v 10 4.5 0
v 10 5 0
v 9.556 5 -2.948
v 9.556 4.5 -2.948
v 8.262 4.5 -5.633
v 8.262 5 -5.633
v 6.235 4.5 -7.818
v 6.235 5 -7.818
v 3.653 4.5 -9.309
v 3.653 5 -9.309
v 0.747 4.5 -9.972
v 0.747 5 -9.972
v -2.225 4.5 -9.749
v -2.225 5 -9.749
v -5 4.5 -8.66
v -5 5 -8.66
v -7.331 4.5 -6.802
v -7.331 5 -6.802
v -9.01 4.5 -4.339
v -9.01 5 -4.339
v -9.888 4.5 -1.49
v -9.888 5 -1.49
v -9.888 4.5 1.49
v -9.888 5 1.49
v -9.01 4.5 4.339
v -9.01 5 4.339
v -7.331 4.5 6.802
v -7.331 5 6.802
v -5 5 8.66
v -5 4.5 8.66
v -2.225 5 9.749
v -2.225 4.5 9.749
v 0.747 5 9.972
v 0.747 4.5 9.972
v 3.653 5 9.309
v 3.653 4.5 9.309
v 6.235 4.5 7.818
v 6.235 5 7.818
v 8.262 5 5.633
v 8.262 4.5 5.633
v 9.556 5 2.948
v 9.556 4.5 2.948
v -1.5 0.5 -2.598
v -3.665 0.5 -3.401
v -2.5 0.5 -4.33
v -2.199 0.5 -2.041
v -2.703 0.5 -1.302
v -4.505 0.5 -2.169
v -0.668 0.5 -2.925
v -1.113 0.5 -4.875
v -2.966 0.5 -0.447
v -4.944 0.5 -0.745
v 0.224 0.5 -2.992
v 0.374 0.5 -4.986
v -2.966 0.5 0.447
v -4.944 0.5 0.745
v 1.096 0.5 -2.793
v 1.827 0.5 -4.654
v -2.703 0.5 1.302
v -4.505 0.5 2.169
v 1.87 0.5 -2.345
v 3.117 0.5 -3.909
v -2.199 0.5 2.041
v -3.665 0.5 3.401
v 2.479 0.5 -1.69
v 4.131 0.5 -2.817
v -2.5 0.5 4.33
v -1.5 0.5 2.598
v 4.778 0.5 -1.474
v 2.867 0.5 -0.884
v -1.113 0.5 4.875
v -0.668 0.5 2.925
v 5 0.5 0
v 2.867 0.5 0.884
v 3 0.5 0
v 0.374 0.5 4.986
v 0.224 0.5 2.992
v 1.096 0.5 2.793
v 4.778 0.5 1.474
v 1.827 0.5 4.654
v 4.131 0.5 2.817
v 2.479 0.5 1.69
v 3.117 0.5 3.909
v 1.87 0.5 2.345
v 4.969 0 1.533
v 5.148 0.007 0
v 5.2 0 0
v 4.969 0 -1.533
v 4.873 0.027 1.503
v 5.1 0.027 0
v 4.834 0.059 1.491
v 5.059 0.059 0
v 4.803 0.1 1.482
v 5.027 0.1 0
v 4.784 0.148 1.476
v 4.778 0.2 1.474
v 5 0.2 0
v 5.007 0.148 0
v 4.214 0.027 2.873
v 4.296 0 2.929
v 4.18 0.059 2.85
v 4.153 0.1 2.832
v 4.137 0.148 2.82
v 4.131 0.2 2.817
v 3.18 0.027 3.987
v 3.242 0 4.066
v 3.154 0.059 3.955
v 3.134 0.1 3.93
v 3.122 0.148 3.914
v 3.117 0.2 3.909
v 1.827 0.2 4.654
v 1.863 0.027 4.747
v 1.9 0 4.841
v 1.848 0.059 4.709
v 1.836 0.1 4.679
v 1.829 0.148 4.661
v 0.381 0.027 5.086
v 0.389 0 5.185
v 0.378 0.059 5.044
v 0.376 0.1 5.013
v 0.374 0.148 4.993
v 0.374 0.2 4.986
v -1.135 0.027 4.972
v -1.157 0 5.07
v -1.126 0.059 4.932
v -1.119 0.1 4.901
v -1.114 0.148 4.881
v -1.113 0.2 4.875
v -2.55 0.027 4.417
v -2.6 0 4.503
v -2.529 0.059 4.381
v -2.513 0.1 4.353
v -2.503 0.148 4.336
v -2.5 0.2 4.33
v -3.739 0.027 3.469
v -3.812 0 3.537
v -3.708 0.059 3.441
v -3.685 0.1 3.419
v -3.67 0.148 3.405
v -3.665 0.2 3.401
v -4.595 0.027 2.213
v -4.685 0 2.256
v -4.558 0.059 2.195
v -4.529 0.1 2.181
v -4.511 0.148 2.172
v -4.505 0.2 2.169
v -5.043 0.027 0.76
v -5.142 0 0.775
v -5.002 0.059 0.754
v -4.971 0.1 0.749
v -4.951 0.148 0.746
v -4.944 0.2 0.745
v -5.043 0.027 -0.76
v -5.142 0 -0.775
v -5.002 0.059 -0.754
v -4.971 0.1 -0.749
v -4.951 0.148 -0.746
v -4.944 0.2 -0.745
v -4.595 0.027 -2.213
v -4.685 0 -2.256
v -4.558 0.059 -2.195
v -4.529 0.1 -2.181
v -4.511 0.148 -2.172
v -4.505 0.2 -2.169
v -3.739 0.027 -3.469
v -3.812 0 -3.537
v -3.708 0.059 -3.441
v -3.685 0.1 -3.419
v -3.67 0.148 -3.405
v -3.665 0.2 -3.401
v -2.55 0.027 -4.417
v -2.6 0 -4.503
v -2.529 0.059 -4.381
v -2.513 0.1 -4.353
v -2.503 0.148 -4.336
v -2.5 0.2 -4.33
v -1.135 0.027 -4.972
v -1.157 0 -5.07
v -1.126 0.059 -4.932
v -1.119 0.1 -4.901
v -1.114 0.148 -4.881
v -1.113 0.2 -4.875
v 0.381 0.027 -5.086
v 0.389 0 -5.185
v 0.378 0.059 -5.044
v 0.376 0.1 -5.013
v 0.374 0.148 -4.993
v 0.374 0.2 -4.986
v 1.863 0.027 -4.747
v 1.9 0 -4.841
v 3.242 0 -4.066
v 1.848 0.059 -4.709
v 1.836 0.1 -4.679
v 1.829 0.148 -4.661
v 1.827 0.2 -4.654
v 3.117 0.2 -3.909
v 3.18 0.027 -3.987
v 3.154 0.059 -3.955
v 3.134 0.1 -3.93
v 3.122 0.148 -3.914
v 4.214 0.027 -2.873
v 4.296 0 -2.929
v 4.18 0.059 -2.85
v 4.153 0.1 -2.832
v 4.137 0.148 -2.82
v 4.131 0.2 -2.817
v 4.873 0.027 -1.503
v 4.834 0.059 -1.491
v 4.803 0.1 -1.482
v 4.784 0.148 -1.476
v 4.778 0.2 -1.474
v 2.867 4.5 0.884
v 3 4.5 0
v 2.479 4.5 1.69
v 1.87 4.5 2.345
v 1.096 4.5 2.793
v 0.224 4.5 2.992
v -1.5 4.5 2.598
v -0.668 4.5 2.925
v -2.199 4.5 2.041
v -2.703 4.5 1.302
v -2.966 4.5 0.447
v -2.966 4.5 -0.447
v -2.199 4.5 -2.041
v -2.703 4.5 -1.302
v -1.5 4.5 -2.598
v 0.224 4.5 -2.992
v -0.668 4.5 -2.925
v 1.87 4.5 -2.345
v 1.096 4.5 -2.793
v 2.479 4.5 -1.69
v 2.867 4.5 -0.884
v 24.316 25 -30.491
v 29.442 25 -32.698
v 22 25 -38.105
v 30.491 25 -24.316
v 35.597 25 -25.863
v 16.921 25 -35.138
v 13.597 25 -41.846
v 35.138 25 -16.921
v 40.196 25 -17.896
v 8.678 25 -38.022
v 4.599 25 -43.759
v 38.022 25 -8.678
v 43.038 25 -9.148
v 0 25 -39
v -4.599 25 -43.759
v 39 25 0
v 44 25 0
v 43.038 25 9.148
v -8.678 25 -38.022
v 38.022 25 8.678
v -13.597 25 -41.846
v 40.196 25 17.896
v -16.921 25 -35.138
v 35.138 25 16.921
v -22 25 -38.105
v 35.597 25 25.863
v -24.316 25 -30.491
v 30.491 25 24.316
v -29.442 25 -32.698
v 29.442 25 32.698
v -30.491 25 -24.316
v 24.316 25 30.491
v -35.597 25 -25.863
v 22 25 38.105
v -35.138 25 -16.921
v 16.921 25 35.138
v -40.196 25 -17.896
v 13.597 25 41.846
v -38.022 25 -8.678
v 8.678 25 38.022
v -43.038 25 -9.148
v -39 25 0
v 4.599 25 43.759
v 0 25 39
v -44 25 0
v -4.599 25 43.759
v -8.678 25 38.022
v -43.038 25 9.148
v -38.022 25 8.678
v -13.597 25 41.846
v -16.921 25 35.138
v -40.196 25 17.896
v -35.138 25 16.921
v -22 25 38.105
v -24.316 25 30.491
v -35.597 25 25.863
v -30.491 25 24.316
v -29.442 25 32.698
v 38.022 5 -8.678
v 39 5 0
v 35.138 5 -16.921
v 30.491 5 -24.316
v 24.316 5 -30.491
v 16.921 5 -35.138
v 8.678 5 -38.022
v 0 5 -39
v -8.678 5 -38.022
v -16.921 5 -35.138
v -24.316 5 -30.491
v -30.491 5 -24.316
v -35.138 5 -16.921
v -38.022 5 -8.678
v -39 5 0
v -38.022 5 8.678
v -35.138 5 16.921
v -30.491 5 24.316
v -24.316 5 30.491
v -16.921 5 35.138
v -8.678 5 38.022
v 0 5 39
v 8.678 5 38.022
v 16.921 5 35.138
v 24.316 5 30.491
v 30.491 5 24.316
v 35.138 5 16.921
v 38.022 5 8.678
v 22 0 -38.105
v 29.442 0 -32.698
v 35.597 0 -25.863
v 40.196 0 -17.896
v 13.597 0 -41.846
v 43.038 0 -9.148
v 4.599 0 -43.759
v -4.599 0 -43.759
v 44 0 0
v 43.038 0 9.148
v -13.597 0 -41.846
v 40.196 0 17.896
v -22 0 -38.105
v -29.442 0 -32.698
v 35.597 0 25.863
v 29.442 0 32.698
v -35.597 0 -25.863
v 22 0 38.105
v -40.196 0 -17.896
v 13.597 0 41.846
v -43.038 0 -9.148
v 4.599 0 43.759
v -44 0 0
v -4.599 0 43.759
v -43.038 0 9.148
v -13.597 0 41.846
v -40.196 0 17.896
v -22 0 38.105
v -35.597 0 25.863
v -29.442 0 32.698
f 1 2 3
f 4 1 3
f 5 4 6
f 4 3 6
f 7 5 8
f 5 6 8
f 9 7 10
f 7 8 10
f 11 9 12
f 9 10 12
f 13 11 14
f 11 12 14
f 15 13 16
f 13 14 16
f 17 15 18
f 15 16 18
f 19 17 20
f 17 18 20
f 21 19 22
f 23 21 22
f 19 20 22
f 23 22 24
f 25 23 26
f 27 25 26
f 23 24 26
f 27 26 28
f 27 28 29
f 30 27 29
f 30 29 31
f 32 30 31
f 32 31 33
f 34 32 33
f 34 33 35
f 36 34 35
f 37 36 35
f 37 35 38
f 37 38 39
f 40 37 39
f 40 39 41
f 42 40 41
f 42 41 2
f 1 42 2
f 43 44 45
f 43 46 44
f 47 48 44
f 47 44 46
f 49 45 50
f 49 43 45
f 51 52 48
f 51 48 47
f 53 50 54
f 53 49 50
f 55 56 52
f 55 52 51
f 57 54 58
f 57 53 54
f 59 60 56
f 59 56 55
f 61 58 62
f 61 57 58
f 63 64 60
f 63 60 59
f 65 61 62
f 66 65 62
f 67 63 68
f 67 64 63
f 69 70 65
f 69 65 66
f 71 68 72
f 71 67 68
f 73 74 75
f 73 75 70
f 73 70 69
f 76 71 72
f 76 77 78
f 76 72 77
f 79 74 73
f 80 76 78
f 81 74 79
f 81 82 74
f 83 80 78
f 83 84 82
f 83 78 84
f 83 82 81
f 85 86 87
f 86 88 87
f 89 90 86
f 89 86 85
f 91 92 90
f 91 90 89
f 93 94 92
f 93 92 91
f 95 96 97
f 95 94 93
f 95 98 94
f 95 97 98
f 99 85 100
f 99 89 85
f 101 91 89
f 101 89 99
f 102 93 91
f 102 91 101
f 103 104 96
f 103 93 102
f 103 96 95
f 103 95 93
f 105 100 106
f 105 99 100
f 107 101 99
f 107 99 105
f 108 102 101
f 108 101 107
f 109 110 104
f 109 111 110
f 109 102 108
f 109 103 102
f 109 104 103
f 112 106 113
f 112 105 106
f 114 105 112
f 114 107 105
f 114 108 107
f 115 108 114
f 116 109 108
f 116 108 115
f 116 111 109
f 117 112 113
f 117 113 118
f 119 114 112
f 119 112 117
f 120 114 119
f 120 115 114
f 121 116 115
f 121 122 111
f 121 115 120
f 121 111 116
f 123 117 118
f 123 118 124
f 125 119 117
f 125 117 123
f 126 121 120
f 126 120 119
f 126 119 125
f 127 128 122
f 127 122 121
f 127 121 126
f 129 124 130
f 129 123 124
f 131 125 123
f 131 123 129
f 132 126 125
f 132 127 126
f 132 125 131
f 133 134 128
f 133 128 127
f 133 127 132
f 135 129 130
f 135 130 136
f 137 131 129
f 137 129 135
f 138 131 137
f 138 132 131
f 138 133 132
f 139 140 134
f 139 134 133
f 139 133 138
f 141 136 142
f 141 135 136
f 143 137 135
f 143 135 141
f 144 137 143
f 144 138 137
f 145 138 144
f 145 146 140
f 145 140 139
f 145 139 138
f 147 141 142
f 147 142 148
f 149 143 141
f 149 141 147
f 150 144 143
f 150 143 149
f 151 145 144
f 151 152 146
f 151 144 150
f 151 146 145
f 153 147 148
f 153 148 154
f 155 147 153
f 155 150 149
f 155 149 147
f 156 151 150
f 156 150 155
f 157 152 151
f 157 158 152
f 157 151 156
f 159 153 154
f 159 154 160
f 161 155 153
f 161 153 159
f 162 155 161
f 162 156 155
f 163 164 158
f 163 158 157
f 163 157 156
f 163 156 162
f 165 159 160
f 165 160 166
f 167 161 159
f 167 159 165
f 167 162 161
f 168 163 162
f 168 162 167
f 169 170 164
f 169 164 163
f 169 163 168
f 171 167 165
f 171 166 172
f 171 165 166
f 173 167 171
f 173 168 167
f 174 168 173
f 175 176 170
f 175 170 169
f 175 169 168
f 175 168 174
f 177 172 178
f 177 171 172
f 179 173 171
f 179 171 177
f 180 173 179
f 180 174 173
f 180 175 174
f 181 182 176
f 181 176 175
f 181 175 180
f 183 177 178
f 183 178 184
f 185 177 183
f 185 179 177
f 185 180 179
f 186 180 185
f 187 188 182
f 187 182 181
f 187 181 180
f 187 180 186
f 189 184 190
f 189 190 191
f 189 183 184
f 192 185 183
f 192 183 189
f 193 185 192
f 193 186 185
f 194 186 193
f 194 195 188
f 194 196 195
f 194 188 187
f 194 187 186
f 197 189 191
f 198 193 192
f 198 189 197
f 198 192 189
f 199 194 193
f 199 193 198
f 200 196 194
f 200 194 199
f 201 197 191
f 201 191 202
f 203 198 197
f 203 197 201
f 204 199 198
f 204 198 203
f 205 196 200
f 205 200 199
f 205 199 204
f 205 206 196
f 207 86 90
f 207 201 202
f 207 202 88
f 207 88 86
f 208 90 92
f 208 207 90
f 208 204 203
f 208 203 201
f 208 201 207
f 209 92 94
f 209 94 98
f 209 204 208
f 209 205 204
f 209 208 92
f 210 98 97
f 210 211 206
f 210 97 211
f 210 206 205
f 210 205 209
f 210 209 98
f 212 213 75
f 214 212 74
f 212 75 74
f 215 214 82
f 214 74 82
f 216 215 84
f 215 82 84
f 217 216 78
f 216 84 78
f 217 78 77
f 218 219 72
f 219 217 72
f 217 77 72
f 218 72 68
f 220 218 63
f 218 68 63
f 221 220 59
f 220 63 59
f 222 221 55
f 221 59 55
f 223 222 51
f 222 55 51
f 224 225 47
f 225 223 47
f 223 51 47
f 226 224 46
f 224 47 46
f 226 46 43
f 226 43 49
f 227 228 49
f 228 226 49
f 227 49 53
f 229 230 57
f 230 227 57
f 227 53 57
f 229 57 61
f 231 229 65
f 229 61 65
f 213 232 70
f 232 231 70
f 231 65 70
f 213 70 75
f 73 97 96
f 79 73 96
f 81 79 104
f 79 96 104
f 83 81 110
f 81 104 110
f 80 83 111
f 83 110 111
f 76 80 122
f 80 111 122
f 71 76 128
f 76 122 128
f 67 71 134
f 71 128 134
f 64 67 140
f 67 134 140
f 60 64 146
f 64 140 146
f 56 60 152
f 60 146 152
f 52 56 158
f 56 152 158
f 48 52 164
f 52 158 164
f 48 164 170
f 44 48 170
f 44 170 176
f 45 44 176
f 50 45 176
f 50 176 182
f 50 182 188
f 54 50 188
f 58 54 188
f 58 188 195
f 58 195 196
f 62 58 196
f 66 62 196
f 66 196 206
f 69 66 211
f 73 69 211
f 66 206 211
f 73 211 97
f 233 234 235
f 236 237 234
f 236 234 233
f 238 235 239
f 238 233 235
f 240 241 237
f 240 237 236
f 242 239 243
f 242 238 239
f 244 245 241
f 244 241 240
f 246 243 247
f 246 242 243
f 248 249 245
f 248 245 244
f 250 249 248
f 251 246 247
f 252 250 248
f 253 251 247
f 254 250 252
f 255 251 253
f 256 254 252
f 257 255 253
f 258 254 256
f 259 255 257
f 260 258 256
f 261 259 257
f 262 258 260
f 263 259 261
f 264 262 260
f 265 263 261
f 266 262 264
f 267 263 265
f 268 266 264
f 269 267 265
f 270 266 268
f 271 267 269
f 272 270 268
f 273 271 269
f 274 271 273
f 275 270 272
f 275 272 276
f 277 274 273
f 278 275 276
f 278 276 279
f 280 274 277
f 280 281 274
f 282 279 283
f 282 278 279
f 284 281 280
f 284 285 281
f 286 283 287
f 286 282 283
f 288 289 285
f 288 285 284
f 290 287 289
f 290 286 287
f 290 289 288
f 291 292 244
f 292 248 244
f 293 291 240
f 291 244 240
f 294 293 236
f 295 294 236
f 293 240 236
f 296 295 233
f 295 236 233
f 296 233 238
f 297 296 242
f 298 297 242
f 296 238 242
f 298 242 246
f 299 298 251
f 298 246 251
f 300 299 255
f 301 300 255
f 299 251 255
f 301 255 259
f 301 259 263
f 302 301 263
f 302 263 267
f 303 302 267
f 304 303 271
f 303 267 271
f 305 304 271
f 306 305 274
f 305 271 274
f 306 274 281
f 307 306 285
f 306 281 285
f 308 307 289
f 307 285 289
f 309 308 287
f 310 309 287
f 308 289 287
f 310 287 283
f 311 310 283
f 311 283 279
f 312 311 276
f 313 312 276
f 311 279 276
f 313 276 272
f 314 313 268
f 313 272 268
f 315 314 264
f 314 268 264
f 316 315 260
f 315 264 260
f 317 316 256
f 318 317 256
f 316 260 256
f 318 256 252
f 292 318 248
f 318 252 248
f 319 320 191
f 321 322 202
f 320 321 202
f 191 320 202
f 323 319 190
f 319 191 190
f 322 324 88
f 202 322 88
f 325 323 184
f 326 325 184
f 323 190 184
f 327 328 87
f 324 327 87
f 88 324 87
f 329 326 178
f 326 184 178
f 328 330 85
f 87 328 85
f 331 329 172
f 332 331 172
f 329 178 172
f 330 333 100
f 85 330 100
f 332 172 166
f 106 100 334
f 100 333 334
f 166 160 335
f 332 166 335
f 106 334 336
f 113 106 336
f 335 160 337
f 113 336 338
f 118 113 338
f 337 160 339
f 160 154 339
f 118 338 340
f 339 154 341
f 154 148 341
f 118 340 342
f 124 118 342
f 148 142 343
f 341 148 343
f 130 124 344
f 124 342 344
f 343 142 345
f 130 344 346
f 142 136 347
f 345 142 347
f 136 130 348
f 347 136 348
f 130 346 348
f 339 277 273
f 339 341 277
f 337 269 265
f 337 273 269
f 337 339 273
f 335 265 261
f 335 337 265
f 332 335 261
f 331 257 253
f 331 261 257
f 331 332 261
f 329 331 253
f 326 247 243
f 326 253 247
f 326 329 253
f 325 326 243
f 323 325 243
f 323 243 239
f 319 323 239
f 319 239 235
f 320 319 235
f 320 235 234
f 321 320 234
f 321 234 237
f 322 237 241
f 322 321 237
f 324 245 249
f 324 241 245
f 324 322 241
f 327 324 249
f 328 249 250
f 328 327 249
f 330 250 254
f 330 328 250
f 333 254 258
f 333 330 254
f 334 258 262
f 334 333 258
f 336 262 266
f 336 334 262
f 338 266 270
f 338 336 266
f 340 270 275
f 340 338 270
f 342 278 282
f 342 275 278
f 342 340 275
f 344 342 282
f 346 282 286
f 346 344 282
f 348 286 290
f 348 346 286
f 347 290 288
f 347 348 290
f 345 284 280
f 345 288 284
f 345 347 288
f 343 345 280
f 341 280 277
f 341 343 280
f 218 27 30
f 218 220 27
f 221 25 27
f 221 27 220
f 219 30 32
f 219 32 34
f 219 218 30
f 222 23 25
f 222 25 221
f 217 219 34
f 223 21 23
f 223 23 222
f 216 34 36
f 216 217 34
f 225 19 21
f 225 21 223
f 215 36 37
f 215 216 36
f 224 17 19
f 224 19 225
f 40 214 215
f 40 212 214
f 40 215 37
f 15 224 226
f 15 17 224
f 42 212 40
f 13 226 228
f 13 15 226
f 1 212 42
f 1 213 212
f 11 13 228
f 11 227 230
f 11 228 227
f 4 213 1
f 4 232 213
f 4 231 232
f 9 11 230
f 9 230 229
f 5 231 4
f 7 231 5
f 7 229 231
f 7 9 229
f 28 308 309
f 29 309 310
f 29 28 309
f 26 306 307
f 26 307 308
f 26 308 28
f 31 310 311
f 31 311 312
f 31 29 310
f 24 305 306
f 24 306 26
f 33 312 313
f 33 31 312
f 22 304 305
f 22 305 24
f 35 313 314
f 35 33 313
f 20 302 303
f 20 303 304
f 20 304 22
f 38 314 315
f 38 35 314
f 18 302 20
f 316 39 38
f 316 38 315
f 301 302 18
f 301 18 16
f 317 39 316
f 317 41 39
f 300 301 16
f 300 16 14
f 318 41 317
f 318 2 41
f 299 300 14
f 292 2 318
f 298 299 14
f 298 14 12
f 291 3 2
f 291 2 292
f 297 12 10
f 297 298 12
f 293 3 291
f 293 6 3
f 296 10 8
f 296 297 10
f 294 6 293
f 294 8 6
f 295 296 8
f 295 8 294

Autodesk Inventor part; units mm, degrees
ref_plane "YZ Plane" through (0, 0, 0) normal (1, 0, 0) x (0, 1, 0)
ref_plane "XZ Plane" through (0, 0, 0) normal (0, 1, 0) x (-1, 0, 0)
ref_plane "XY Plane" through (0, 0, 0) normal (0, 0, 1) x (1, 0, 0)
sketch "Sketch1" plane through (0, 0, 0) normal (0, 1, 0) x (-1, 0, 0)
  circle A0 centre (0, 0) radius 44
  dimension "d0" = 88
extrude "Extrusion1" add sketch "Sketch1" along normal blind 25
sketch "Sketch2" plane through (0, 25, 0) normal (0, 1, 0) x (1, 0, 0)
  circle A0 centre (0, 0) radius 44
  circle A1 centre (0, 0) radius 39
  dimension "d5" = 5
extrude "Extrusion2" cut sketch "Sketch2" against normal blind 20 contours A1
sketch "Sketch3" plane through (0, 0, 0) normal (0, -1, 0) x (1, 0, 0)
  circle A0 centre (0, 0) radius 3
  circle A1 centre (0, 0) radius 5
  dimension "d8" = 6
  dimension "d9" = 2
extrude "Extrusion3" cut sketch "Sketch3" against normal blind 20 contours A0
extrude "Extrusion4" cut sketch "Sketch3" against normal blind 0.5
fillet "Fillet1" radius 0.2 1 edges at (-5, 0, 0)
sketch "Sketch4" plane through (0, 5, 0) normal (0, 1, 0) x (1, 0, 0)
  circle A0 centre (0, 0) radius 3 projected
  circle A1 centre (0, 0) radius 10
  dimension "d15" = 20
extrude "Extrusion5" cut sketch "Sketch4" against normal blind 0.5
properties part number "bottom" material "Polyethylene, High Density"
